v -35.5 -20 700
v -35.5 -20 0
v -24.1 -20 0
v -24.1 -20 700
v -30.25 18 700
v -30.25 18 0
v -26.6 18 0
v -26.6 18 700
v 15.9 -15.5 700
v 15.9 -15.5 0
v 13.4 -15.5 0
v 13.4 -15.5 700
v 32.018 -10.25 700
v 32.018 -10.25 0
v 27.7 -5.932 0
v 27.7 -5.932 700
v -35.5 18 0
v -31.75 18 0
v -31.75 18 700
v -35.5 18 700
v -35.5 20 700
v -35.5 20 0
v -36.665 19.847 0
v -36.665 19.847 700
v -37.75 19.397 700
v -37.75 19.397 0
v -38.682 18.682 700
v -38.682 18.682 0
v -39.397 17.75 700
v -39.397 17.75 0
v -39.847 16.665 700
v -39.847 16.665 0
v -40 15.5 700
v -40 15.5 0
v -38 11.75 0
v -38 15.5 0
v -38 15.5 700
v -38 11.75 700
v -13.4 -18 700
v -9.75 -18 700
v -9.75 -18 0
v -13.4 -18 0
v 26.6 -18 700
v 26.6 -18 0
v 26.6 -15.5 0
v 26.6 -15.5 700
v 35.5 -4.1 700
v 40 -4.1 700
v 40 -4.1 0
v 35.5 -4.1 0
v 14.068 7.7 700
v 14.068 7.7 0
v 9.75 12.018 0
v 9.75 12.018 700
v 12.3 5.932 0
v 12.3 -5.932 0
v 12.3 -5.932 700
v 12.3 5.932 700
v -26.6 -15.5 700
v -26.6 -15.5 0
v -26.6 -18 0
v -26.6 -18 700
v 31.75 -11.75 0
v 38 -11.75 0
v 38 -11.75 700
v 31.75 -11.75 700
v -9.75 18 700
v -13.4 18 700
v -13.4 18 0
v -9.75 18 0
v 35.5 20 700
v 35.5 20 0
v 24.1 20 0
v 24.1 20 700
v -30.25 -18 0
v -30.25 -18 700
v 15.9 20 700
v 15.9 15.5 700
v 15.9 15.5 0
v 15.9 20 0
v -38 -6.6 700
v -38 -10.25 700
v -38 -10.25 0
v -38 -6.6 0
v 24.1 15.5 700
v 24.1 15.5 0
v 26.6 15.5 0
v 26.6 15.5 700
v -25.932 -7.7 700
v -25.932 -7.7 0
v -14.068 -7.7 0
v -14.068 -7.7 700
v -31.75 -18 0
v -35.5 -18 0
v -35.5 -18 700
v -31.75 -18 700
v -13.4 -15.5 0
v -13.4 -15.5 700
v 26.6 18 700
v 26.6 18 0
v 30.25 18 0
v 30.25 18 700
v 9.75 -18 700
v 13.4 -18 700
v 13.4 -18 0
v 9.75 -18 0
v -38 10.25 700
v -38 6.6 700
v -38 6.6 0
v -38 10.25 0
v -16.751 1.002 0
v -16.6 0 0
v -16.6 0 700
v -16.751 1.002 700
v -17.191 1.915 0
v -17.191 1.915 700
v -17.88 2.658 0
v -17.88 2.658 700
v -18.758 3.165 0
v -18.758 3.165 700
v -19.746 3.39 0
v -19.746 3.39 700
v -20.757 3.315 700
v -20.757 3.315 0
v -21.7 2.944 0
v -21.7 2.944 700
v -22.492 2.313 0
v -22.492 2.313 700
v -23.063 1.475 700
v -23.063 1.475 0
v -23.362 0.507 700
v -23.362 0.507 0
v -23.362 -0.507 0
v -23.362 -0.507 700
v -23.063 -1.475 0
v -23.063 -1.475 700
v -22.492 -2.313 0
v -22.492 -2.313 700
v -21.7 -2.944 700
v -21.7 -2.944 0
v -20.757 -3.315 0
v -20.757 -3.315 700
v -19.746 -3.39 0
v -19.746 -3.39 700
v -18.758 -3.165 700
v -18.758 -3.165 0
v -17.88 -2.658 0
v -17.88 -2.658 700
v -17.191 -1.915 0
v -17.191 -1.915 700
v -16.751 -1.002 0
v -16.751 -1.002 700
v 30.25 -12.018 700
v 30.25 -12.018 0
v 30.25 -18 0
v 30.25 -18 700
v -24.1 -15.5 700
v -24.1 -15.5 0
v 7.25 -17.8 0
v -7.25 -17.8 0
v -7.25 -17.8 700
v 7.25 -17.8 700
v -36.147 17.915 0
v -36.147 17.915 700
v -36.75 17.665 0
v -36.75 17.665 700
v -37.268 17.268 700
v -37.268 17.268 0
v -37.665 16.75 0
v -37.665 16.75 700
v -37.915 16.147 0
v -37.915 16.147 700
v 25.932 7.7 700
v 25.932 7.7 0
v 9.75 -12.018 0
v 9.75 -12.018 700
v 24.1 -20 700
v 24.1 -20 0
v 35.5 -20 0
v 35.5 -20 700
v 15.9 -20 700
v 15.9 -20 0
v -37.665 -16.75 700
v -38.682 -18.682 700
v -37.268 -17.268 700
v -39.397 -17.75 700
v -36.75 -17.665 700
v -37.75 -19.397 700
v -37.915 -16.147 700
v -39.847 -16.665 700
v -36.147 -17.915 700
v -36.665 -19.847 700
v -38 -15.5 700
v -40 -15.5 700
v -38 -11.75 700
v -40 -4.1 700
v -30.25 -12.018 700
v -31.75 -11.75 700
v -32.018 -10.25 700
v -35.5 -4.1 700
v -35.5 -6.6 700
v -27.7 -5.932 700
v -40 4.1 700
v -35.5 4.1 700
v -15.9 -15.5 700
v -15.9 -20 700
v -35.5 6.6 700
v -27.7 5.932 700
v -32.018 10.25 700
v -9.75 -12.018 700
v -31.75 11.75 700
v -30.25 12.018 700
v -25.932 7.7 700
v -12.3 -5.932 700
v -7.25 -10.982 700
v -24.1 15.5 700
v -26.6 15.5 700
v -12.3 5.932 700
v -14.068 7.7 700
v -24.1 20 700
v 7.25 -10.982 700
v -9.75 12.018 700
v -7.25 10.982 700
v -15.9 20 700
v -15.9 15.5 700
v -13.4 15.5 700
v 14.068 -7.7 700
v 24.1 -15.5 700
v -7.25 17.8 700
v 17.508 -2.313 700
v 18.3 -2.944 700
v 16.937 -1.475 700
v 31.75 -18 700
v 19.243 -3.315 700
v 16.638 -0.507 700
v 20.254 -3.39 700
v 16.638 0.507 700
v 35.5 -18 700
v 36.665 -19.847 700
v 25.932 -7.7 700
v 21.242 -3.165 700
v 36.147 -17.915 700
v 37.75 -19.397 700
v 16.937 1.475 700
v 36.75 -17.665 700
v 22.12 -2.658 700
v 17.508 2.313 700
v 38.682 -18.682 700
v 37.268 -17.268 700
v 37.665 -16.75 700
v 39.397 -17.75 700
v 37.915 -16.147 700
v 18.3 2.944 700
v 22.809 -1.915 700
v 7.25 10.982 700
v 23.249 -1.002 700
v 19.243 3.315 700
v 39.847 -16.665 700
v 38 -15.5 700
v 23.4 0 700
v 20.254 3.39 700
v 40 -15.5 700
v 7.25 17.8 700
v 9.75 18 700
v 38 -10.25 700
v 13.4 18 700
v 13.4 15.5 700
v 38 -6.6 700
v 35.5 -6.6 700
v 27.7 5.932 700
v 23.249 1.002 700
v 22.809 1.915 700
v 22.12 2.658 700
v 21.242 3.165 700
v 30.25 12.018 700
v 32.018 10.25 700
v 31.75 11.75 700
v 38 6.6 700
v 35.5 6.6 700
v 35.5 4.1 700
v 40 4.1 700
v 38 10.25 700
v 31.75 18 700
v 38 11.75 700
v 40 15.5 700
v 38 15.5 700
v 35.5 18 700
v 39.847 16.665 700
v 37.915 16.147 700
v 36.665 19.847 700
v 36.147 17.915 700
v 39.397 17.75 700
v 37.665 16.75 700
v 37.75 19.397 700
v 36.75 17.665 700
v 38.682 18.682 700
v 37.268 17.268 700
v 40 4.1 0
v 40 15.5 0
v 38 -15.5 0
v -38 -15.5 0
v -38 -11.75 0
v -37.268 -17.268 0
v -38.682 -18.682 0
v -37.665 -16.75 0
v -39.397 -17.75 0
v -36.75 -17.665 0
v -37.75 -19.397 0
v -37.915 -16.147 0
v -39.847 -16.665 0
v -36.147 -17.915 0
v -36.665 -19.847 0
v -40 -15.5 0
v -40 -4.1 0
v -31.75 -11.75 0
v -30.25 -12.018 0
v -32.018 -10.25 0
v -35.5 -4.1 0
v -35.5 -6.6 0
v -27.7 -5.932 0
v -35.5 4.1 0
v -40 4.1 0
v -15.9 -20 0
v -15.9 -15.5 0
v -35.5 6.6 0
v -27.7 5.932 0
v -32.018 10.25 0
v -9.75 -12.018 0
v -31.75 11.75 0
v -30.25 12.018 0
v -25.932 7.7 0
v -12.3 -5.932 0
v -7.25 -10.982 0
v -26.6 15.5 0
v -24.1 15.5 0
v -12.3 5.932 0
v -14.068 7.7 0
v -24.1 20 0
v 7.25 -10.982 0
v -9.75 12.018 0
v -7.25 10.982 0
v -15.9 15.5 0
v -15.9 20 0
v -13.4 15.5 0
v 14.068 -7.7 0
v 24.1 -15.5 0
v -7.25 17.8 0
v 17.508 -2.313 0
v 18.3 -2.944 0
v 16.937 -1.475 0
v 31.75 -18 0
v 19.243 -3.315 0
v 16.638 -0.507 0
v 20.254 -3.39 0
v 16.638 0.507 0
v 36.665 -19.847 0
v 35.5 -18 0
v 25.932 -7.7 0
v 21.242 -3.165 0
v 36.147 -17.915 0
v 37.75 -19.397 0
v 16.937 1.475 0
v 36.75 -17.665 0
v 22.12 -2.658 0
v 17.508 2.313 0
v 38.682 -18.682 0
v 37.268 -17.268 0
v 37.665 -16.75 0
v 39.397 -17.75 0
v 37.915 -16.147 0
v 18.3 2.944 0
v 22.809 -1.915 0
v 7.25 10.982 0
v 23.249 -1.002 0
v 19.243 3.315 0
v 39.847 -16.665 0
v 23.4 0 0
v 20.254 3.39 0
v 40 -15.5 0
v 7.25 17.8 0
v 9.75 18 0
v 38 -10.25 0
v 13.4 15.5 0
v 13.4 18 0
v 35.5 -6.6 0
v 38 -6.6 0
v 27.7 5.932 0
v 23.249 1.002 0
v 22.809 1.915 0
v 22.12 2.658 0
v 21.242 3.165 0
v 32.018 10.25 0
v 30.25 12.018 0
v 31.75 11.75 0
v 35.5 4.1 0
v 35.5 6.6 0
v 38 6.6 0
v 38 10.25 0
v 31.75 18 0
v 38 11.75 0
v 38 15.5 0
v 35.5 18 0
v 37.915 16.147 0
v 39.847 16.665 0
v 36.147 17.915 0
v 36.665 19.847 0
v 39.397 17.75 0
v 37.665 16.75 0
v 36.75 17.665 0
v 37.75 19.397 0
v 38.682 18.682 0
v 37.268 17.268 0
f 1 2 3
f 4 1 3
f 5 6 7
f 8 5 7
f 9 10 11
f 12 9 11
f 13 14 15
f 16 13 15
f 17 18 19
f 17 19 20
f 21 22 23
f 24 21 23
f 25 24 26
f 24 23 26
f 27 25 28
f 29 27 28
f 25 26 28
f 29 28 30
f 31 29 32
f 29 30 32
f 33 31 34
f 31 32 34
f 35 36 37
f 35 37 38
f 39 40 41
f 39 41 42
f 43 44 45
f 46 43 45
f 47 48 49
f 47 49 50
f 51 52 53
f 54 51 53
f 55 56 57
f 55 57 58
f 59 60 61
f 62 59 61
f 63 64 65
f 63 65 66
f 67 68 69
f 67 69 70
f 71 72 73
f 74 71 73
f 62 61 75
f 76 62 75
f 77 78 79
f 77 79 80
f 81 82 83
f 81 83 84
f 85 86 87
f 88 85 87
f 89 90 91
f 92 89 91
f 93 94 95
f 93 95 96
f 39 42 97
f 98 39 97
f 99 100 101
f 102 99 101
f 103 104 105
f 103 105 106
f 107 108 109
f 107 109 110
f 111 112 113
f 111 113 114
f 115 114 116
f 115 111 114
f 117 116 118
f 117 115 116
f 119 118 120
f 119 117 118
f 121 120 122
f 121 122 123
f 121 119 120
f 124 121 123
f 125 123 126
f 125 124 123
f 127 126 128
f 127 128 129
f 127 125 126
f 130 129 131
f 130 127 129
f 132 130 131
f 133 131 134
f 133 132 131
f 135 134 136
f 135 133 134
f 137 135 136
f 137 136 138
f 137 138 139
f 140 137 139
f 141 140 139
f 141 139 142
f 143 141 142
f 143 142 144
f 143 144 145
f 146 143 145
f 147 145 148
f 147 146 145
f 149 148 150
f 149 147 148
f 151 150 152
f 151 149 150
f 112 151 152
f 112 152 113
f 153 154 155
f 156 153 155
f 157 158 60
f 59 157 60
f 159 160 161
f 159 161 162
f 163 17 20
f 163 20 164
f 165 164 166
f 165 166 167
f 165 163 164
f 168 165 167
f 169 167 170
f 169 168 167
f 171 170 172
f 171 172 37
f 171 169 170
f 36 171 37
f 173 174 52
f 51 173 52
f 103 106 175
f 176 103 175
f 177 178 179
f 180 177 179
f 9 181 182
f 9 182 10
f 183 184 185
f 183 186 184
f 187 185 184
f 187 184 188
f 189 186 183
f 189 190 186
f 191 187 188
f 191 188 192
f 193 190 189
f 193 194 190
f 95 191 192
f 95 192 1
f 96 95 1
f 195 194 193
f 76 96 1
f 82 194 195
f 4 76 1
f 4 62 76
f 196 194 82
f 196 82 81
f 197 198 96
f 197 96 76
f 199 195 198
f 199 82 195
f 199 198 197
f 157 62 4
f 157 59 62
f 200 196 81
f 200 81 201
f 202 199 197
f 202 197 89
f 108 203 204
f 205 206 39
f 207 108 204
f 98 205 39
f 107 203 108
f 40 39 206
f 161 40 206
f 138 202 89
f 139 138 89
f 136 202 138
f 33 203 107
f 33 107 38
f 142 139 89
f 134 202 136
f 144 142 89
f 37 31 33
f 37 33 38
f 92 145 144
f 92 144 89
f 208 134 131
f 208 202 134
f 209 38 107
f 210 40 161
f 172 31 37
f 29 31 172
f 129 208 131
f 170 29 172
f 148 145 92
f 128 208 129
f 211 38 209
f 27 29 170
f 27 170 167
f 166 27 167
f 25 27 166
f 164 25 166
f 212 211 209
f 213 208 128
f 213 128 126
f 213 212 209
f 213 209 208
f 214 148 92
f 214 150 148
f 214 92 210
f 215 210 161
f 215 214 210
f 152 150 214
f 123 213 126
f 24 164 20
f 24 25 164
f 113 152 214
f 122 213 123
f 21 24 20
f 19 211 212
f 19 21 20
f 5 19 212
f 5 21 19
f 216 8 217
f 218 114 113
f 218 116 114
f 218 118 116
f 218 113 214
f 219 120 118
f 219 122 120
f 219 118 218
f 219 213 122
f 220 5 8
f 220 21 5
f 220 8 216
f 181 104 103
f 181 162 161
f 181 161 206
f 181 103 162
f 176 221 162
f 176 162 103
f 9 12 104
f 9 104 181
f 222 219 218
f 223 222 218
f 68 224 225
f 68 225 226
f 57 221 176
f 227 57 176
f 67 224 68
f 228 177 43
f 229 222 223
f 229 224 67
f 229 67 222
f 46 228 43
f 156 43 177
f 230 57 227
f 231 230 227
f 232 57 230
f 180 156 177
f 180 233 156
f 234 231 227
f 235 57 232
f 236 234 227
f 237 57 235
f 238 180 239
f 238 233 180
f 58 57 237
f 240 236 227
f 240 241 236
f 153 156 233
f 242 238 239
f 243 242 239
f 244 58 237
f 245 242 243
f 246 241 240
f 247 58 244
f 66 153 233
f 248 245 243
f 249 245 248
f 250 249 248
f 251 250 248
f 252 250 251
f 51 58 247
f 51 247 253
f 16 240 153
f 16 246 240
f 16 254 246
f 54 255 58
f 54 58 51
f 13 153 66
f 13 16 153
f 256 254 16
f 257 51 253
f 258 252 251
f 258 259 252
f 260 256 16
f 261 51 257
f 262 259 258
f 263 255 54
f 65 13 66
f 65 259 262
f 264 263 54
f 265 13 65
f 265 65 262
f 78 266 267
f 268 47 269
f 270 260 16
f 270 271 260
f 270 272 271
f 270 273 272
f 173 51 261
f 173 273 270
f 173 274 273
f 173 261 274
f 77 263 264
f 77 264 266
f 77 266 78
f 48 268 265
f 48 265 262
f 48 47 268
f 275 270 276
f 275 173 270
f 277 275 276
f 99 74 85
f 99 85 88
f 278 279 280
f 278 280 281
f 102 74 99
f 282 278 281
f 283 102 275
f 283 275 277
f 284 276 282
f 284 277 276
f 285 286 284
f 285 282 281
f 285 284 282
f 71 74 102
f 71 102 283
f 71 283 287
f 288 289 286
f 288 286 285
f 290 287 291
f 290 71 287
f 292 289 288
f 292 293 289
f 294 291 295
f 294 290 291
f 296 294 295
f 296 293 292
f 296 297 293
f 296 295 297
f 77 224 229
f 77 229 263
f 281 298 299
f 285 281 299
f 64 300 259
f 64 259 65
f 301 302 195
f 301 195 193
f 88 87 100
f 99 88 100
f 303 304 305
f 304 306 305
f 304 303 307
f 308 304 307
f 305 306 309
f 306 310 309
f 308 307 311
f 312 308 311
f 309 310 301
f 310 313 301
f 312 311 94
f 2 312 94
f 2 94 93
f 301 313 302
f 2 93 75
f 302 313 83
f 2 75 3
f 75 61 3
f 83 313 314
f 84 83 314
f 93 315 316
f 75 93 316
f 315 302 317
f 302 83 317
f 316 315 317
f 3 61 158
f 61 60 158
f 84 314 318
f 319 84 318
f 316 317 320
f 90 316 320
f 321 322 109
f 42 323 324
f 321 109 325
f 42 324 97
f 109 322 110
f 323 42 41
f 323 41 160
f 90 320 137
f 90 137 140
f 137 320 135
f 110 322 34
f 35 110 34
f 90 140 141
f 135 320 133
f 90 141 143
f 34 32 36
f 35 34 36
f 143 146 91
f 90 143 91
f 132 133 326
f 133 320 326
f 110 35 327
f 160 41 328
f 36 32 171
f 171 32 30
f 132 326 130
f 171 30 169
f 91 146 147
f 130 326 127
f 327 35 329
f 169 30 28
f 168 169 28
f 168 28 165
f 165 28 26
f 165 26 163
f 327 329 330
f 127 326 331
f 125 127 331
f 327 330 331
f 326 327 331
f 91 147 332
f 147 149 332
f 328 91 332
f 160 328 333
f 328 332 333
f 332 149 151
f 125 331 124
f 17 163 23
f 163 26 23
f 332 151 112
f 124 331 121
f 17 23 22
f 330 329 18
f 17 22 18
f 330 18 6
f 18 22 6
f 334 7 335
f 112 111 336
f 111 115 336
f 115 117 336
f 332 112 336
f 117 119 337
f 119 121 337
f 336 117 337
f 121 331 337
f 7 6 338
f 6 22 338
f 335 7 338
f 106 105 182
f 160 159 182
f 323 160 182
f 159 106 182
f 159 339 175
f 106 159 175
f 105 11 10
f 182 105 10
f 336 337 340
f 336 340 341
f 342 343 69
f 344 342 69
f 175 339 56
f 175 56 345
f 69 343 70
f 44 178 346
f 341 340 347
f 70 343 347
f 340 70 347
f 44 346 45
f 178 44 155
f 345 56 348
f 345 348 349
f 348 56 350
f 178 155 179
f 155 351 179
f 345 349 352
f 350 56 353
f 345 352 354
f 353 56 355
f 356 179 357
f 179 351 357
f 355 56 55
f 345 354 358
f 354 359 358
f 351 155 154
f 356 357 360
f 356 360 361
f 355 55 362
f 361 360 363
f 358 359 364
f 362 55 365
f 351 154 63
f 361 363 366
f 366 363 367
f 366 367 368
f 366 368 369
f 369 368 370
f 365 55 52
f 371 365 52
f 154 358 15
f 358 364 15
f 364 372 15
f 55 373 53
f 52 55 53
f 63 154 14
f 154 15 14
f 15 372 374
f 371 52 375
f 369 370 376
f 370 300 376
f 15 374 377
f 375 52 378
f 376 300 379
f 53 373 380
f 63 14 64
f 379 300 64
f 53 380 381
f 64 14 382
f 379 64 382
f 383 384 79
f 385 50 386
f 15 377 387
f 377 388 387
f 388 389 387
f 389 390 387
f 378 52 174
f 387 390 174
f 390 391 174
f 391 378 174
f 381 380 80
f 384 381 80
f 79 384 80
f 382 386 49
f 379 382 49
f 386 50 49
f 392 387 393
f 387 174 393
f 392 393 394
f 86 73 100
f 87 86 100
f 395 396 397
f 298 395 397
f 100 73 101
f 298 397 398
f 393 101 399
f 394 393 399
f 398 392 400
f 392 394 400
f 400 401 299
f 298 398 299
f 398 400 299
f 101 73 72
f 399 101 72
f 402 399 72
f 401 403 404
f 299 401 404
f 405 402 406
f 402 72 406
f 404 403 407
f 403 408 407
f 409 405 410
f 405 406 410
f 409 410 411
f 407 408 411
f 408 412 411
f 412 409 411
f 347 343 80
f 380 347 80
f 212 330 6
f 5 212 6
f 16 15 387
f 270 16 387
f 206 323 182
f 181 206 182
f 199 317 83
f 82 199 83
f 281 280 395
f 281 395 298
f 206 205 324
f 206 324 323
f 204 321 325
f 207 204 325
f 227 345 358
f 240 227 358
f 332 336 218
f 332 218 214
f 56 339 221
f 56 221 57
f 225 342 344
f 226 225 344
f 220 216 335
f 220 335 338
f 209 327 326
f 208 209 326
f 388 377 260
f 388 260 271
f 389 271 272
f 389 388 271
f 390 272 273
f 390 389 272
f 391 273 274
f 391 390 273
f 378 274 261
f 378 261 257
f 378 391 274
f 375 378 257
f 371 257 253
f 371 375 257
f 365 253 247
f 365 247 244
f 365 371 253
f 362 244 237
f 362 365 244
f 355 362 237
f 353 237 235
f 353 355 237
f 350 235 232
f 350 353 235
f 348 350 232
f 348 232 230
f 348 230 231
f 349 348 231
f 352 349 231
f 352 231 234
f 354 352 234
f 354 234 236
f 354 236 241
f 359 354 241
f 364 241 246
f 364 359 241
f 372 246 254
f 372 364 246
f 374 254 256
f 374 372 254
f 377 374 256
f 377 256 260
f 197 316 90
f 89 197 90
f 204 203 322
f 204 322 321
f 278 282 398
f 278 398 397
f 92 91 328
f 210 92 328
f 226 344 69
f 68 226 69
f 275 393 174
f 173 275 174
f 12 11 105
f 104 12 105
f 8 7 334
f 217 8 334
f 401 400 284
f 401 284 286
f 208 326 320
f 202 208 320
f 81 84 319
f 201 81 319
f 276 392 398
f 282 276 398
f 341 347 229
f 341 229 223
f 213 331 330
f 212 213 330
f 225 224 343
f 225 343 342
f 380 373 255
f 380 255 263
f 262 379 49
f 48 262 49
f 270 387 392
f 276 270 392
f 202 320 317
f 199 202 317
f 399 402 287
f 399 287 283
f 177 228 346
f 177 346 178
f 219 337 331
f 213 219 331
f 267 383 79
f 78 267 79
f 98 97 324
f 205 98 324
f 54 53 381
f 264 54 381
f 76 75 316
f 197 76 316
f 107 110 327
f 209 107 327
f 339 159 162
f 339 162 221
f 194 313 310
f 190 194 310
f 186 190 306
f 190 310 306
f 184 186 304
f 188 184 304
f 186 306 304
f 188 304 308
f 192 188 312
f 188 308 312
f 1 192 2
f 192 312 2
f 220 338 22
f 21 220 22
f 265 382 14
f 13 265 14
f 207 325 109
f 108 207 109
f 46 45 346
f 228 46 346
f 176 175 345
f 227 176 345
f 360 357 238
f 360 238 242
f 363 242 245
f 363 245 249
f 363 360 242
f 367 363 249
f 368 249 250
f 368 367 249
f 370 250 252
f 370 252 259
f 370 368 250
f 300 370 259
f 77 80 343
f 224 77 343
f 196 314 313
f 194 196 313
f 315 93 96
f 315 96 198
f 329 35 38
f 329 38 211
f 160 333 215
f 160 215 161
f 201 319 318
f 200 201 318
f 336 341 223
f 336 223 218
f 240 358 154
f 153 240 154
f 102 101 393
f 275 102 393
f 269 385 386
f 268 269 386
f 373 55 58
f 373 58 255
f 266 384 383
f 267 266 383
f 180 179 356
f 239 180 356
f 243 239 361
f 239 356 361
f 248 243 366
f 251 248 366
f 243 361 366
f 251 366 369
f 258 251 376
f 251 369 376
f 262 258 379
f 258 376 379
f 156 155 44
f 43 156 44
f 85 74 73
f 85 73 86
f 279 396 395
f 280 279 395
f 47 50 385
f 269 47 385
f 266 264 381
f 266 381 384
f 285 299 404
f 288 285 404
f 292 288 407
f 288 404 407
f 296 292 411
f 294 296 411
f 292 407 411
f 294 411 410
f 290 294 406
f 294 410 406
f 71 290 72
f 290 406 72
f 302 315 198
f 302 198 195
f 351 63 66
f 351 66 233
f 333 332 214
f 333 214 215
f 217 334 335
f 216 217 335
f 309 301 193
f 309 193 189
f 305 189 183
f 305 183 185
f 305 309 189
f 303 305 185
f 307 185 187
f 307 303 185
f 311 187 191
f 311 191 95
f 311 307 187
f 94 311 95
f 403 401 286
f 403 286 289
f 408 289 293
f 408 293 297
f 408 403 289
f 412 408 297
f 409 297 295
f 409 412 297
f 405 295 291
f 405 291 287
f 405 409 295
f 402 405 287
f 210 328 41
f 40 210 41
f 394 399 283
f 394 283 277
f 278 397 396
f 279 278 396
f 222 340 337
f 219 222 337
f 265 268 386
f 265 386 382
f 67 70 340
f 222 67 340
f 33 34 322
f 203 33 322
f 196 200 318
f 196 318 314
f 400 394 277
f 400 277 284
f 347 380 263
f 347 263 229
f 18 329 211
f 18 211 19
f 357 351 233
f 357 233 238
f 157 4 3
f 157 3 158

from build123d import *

# Parameters (mm, degrees)
SKETCH1_R           = 3.4
BOSS_EXTRUDE1_DEPTH = 700


with BuildPart() as part:
    # Sketch1 → Boss-Extrude1 (new body)
    with BuildSketch(Plane.XY):
        with BuildLine():
            Line((24.1, -20), (35.5, -20))
            ThreePointArc((35.5, -20), (38.681980515, -18.681980515), (40, -15.5))
            Line((40, -15.5), (40, -4.1))
            Line((40, -4.1), (35.5, -4.1))
            Line((35.5, -4.1), (35.5, -6.6))
            Line((35.5, -6.6), (38, -6.6))
            Line((38, -6.6), (38, -10.25))
            Line((38, -10.25), (32.017766953, -10.25))
            Line((32.017766953, -10.25), (27.7, -5.932233047))
            Line((27.7, -5.932233047), (27.7, 5.932233047))
            Line((27.7, 5.932233047), (32.017766953, 10.25))
            Line((32.017766953, 10.25), (38, 10.25))
            Line((38, 10.25), (38, 6.6))
            Line((38, 6.6), (35.5, 6.6))
            Line((35.5, 6.6), (35.5, 4.1))
            Line((35.5, 4.1), (40, 4.1))
            Line((40, 4.1), (40, 15.5))
            ThreePointArc((40, 15.5), (38.681980515, 18.681980515), (35.5, 20))
            Line((35.5, 20), (24.1, 20))
            Line((24.1, 20), (24.1, 15.5))
            Line((24.1, 15.5), (26.6, 15.5))
            Line((26.6, 15.5), (26.6, 18))
            Line((26.6, 18), (30.25, 18))
            Line((30.25, 18), (30.25, 12.017766953))
            Line((30.25, 12.017766953), (25.932233047, 7.7))
            Line((25.932233047, 7.7), (14.067766953, 7.7))
            Line((14.067766953, 7.7), (9.75, 12.017766953))
            Line((9.75, 12.017766953), (9.75, 18))
            Line((9.75, 18), (13.4, 18))
            Line((13.4, 18), (13.4, 15.5))
            Line((13.4, 15.5), (15.9, 15.5))
            Line((15.9, 15.5), (15.9, 20))
            Line((15.9, 20), (-15.9, 20))
            Line((-15.9, 20), (-15.9, 15.5))
            Line((-15.9, 15.5), (-13.4, 15.5))
            Line((-13.4, 15.5), (-13.4, 18))
            Line((-13.4, 18), (-9.75, 18))
            Line((-9.75, 18), (-9.75, 12.017766953))
            Line((-9.75, 12.017766953), (-14.067766953, 7.7))
            Line((-14.067766953, 7.7), (-25.932233047, 7.7))
            Line((-25.932233047, 7.7), (-30.25, 12.017766953))
            Line((-30.25, 12.017766953), (-30.25, 18))
            Line((-30.25, 18), (-26.6, 18))
            Line((-26.6, 18), (-26.6, 15.5))
            Line((-26.6, 15.5), (-24.1, 15.5))
            Line((-24.1, 15.5), (-24.1, 20))
            Line((-24.1, 20), (-35.5, 20))
            ThreePointArc((-35.5, 20), (-38.681980515, 18.681980515), (-40, 15.5))
            Line((-40, 15.5), (-40, 4.1))
            Line((-40, 4.1), (-35.5, 4.1))
            Line((-35.5, 4.1), (-35.5, 6.6))
            Line((-35.5, 6.6), (-38, 6.6))
            Line((-38, 6.6), (-38, 10.25))
            Line((-38, 10.25), (-32.017766953, 10.25))
            Line((-32.017766953, 10.25), (-27.7, 5.932233047))
            Line((-27.7, 5.932233047), (-27.7, -5.932233047))
            Line((-27.7, -5.932233047), (-32.017766953, -10.25))
            Line((-32.017766953, -10.25), (-38, -10.25))
            Line((-38, -10.25), (-38, -6.6))
            Line((-38, -6.6), (-35.5, -6.6))
            Line((-35.5, -6.6), (-35.5, -4.1))
            Line((-35.5, -4.1), (-40, -4.1))
            Line((-40, -4.1), (-40, -15.5))
            ThreePointArc((-40, -15.5), (-38.681980515, -18.681980515), (-35.5, -20))
            Line((-35.5, -20), (-24.1, -20))
            Line((-24.1, -20), (-24.1, -15.5))
            Line((-24.1, -15.5), (-26.6, -15.5))
            Line((-26.6, -15.5), (-26.6, -18))
            Line((-26.6, -18), (-30.25, -18))
            Line((-30.25, -18), (-30.25, -12.017766953))
            Line((-30.25, -12.017766953), (-25.932233047, -7.7))
            Line((-25.932233047, -7.7), (-14.067766953, -7.7))
            Line((-14.067766953, -7.7), (-9.75, -12.017766953))
            Line((-9.75, -12.017766953), (-9.75, -18))
            Line((-9.75, -18), (-13.4, -18))
            Line((-13.4, -18), (-13.4, -15.5))
            Line((-13.4, -15.5), (-15.9, -15.5))
            Line((-15.9, -15.5), (-15.9, -20))
            Line((-15.9, -20), (15.9, -20))
            Line((15.9, -20), (15.9, -15.5))
            Line((15.9, -15.5), (13.4, -15.5))
            Line((13.4, -15.5), (13.4, -18))
            Line((13.4, -18), (9.75, -18))
            Line((9.75, -18), (9.75, -12.017766953))
            Line((9.75, -12.017766953), (14.067766953, -7.7))
            Line((14.067766953, -7.7), (25.932233047, -7.7))
            Line((25.932233047, -7.7), (30.25, -12.017766953))
            Line((30.25, -12.017766953), (30.25, -18))
            Line((30.25, -18), (26.6, -18))
            Line((26.6, -18), (26.6, -15.5))
            Line((26.6, -15.5), (24.1, -15.5))
            Line((24.1, -15.5), (24.1, -20))
        make_face()
        with Locations((-20, 0)):
            Circle(SKETCH1_R, mode=Mode.SUBTRACT)
        with Locations((20, 0)):
            Circle(SKETCH1_R, mode=Mode.SUBTRACT)
        with BuildLine():
            Line((38, -15.5), (38, -11.75))
            Line((38, -11.75), (31.75, -11.75))
            Line((31.75, -11.75), (31.75, -18))
            Line((31.75, -18), (35.5, -18))
            ThreePointArc((35.5, -18), (37.267766953, -17.267766953), (38, -15.5))
        make_face(mode=Mode.SUBTRACT)
        with BuildLine():
            Line((-38, 15.5), (-38, 11.75))
            Line((-38, 11.75), (-31.75, 11.75))
            Line((-31.75, 11.75), (-31.75, 18))
            Line((-31.75, 18), (-35.5, 18))
            ThreePointArc((-35.5, 18), (-37.267766953, 17.267766953), (-38, 15.5))
        make_face(mode=Mode.SUBTRACT)
        Polygon((-7.25, -10.982233047), (-7.25, -17.8), (7.25, -17.8), (7.25, -10.982233047), (12.3, -5.932233047), (12.3, 5.932233047), (7.25, 10.982233047), (7.25, 17.8), (-7.25, 17.8), (-7.25, 10.982233047), (-12.3, 5.932233047), (-12.3, -5.932233047), align=None, mode=Mode.SUBTRACT)
        with BuildLine():
            Line((-35.5, -18), (-31.75, -18))
            Line((-31.75, -18), (-31.75, -11.75))
            Line((-31.75, -11.75), (-38, -11.75))
            Line((-38, -11.75), (-38, -15.5))
            ThreePointArc((-38, -15.5), (-37.267766953, -17.267766953), (-35.5, -18))
        make_face(mode=Mode.SUBTRACT)
        with BuildLine():
            Line((35.5, 18), (31.75, 18))
            Line((31.75, 18), (31.75, 11.75))
            Line((31.75, 11.75), (38, 11.75))
            Line((38, 11.75), (38, 15.5))
            ThreePointArc((38, 15.5), (37.267766953, 17.267766953), (35.5, 18))
        make_face(mode=Mode.SUBTRACT)
    extrude(amount=BOSS_EXTRUDE1_DEPTH)


solid = part.part
